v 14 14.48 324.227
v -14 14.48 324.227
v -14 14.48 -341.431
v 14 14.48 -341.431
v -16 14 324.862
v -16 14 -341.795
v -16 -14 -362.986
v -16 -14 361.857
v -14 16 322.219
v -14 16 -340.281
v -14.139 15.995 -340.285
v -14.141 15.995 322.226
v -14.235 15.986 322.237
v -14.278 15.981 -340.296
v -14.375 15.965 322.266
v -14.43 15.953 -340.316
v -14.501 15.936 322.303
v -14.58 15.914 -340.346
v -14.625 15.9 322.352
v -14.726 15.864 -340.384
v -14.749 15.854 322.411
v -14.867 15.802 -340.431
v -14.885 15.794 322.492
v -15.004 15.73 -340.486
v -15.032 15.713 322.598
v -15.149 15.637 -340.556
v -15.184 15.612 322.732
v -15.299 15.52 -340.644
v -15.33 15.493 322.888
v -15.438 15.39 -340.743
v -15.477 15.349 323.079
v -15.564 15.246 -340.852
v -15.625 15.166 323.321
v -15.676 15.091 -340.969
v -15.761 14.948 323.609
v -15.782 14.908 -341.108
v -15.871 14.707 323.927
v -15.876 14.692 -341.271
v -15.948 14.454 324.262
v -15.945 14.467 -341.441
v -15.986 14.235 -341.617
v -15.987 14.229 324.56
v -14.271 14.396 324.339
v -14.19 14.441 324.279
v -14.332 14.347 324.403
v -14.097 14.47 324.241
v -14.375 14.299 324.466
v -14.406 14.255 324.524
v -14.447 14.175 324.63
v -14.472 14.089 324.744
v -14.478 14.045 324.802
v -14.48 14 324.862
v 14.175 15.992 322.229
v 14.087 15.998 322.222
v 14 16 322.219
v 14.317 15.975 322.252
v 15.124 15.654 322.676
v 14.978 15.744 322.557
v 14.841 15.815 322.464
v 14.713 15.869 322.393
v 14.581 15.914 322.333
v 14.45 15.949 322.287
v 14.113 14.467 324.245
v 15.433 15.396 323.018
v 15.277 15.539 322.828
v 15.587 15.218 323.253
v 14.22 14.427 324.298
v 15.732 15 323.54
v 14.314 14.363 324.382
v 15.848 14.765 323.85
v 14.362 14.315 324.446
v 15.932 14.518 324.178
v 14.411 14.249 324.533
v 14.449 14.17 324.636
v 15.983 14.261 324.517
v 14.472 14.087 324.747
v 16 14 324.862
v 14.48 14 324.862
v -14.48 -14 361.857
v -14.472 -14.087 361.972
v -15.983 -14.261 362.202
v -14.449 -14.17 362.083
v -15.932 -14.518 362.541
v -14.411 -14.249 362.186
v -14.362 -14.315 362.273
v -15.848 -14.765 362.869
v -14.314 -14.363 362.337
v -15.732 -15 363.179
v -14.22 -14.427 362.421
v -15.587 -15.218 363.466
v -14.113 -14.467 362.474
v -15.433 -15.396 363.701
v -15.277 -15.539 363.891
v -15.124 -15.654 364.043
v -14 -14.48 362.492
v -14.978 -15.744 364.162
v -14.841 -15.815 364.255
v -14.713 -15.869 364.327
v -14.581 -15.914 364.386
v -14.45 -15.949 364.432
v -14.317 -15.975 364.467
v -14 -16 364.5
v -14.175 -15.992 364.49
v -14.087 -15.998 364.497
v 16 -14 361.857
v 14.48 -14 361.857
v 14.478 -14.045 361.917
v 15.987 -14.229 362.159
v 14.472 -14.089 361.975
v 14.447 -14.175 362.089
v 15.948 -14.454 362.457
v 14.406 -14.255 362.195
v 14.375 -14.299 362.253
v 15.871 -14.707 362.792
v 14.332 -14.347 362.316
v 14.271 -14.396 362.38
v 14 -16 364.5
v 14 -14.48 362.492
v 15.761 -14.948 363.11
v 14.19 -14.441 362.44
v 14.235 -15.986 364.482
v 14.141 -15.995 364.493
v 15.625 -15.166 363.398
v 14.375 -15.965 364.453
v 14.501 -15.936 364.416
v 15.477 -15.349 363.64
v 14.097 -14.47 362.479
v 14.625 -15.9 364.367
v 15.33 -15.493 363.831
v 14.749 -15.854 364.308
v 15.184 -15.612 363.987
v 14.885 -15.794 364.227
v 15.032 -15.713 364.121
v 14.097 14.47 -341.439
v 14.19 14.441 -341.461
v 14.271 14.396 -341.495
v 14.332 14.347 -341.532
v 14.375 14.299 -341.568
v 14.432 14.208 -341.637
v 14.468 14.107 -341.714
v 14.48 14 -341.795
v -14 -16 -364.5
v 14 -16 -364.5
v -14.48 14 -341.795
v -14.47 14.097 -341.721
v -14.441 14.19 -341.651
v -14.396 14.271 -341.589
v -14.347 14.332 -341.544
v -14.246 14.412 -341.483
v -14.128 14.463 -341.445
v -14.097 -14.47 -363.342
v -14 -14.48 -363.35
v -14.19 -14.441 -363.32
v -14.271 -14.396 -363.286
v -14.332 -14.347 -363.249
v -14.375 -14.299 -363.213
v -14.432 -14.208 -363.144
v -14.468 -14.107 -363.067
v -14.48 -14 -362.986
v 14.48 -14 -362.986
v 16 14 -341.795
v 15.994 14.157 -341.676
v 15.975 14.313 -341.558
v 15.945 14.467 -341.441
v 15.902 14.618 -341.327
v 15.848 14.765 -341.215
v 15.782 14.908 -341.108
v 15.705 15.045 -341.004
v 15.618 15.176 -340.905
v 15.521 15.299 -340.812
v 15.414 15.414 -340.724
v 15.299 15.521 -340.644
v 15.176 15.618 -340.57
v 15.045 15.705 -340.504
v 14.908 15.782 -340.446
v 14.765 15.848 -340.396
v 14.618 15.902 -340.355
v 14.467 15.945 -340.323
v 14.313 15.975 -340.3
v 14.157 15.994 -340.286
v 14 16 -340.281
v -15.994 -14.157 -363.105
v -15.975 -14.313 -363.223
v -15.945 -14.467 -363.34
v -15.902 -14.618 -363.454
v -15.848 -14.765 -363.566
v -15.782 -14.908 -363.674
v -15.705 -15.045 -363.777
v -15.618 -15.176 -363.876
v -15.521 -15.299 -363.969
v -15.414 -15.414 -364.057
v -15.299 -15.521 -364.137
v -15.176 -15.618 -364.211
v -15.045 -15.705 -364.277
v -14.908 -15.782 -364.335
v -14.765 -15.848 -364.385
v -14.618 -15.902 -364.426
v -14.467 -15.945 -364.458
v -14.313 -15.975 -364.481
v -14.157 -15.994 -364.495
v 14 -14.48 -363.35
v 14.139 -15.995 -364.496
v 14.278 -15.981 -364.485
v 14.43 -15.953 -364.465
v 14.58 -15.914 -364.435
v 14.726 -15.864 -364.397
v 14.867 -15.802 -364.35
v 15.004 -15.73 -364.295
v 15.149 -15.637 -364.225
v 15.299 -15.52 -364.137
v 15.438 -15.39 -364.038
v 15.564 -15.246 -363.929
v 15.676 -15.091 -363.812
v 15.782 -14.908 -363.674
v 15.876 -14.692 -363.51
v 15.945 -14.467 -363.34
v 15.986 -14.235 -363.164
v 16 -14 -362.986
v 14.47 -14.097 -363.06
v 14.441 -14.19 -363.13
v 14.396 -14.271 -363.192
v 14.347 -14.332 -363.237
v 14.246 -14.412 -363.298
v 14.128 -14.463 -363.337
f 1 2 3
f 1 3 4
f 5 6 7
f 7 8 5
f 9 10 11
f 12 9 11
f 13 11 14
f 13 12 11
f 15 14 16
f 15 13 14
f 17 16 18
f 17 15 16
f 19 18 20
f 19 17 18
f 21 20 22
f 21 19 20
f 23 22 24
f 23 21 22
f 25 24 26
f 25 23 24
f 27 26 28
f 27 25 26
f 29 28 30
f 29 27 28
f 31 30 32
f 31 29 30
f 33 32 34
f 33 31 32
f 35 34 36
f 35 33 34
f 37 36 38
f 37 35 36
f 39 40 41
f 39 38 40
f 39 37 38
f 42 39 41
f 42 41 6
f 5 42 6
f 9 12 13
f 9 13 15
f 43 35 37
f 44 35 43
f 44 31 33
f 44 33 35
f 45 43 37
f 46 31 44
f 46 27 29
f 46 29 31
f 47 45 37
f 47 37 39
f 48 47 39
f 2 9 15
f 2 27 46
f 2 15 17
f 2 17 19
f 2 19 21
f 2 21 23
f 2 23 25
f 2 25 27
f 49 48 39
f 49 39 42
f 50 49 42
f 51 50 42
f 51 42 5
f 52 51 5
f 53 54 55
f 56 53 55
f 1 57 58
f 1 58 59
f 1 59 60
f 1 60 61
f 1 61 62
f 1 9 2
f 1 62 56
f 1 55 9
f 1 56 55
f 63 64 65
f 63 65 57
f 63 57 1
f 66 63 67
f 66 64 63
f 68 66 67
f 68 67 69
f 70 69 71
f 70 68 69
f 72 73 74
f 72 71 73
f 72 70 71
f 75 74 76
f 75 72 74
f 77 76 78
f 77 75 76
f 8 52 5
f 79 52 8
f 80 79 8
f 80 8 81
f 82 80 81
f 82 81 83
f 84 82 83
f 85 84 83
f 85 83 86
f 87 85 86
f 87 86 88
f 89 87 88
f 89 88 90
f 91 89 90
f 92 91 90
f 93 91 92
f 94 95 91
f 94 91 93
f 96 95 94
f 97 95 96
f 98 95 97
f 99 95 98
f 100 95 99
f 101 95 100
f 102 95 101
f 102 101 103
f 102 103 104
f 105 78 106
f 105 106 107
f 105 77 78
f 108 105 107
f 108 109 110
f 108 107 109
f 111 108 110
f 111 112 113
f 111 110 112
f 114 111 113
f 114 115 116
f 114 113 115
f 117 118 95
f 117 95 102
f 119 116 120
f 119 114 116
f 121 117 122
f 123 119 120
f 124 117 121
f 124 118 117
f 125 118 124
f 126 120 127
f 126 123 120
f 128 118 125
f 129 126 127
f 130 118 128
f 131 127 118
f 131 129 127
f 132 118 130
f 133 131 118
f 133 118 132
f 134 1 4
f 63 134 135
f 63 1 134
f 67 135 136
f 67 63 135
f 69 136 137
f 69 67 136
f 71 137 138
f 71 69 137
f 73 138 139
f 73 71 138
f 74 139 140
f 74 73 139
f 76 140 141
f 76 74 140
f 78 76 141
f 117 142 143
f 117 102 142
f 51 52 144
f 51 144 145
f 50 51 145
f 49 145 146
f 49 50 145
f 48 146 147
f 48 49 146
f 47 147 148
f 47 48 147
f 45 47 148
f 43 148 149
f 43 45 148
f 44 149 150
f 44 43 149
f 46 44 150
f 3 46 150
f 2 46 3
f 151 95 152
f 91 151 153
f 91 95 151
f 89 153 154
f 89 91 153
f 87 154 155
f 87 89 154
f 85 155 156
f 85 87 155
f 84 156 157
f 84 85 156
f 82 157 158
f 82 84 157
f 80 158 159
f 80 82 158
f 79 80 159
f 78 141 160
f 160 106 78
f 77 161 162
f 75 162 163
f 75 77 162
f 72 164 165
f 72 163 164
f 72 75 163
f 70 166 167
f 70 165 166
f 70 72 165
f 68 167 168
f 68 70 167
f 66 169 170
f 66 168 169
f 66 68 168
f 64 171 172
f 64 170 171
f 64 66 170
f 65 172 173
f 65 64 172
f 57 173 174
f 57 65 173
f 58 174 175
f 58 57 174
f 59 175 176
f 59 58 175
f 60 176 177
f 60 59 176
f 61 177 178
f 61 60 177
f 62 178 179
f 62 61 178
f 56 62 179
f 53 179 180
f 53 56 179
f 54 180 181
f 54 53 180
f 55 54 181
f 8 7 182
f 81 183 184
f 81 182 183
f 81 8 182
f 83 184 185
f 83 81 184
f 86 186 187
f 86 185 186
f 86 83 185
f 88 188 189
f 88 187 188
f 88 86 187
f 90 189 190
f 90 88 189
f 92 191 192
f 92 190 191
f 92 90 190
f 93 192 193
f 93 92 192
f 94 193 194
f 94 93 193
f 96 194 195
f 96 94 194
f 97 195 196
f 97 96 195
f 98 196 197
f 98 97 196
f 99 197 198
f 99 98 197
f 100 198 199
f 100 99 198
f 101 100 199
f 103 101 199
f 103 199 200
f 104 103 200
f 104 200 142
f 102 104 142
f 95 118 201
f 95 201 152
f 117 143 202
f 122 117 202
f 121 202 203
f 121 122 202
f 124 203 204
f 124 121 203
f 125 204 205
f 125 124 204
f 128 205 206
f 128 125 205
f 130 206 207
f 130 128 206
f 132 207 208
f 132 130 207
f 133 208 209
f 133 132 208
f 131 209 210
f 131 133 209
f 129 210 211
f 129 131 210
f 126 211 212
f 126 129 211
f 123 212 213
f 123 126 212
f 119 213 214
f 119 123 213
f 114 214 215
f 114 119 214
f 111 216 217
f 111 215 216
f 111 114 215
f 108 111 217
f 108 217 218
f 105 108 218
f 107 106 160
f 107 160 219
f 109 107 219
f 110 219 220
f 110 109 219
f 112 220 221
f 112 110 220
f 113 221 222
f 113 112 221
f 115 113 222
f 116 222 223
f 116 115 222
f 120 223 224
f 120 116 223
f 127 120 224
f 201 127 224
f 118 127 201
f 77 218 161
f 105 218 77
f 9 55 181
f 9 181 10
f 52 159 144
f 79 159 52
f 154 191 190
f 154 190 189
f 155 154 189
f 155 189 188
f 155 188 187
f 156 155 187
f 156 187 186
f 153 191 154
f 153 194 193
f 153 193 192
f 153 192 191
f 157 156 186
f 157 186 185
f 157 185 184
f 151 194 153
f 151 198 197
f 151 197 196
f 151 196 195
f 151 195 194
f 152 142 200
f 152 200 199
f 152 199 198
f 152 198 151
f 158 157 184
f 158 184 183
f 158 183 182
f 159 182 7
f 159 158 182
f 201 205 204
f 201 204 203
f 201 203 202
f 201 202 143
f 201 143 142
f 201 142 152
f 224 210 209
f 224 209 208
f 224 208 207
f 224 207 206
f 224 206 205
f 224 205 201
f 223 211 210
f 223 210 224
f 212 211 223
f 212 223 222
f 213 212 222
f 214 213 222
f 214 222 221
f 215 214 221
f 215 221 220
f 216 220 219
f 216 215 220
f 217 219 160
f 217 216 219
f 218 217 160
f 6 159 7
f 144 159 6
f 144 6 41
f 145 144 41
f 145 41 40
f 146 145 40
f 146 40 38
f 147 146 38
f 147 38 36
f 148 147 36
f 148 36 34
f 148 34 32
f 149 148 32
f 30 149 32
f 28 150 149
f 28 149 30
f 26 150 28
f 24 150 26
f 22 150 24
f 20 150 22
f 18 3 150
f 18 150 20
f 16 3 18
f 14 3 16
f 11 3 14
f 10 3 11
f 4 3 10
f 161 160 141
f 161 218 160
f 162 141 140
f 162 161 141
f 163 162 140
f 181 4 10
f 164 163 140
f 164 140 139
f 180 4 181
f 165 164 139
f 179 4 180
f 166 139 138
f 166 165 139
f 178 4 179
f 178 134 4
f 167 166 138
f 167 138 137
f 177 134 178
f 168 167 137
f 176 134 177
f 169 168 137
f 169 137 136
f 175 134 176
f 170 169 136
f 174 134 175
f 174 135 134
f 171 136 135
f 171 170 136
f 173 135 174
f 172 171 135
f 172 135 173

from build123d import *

# Parameters (mm, degrees)
BOSS_EXTRUDE1_DEPTH      = 364.5
BOSS_EXTRUDE1_DEPTH_BACK = 364.5
CUT_EXTRUDE1_DEPTH       = 367.251621157
CUT_EXTRUDE2_DEPTH       = 367.251621157


with BuildPart() as part:
    # Sketch1 → Boss-Extrude1 (new, two sides: drawn at the far end of the back side and taken through both)
    with BuildSketch(Plane.XY.offset(-BOSS_EXTRUDE1_DEPTH_BACK)):
        with BuildLine():
            Line((-14, -16), (14, -16))
            ThreePointArc((14, -16), (15.414213562, -15.414213562), (16, -14))
            Line((16, -14), (16, 14))
            ThreePointArc((16, 14), (15.414213562, 15.414213562), (14, 16))
            Line((14, 16), (-14, 16))
            ThreePointArc((-14, 16), (-15.414213562, 15.414213562), (-16, 14))
            Line((-16, 14), (-16, -14))
            ThreePointArc((-16, -14), (-15.414213562, -15.414213562), (-14, -16))
        make_face()
        with BuildLine():
            Line((-14, 14.48), (14, 14.48))
            ThreePointArc((14, 14.48), (14.339411255, 14.339411255), (14.48, 14))
            Line((14.48, 14), (14.48, -14))
            ThreePointArc((14.48, -14), (14.339411255, -14.339411255), (14, -14.48))
            Line((14, -14.48), (-14, -14.48))
            ThreePointArc((-14, -14.48), (-14.339411255, -14.339411255), (-14.48, -14))
            Line((-14.48, -14), (-14.48, 14))
            ThreePointArc((-14.48, 14), (-14.339411255, 14.339411255), (-14, 14.48))
        make_face(mode=Mode.SUBTRACT)
    extrude(amount=BOSS_EXTRUDE1_DEPTH + BOSS_EXTRUDE1_DEPTH_BACK)

    # Sketch2 → Cut-Extrude1 (cut, through all)
    with BuildSketch(Plane(origin=(16, 0, 0), x_dir=(0, 0, -1), z_dir=(1, 0, 0))):
        Polygon((-364.5, -16), (-364.5, 16), (-322.219100301, 16), align=None)
    extrude(amount=-CUT_EXTRUDE1_DEPTH, mode=Mode.SUBTRACT)

    # Sketch3 → Cut-Extrude2 (cut, through all)
    with BuildSketch(Plane(origin=(16, 0, 0), x_dir=(0, 0, -1), z_dir=(1, 0, 0))):
        Polygon((364.5, 16), (364.5, -16), (340.281026249, 16), align=None)
    extrude(amount=-CUT_EXTRUDE2_DEPTH, mode=Mode.SUBTRACT)


solid = part.part
